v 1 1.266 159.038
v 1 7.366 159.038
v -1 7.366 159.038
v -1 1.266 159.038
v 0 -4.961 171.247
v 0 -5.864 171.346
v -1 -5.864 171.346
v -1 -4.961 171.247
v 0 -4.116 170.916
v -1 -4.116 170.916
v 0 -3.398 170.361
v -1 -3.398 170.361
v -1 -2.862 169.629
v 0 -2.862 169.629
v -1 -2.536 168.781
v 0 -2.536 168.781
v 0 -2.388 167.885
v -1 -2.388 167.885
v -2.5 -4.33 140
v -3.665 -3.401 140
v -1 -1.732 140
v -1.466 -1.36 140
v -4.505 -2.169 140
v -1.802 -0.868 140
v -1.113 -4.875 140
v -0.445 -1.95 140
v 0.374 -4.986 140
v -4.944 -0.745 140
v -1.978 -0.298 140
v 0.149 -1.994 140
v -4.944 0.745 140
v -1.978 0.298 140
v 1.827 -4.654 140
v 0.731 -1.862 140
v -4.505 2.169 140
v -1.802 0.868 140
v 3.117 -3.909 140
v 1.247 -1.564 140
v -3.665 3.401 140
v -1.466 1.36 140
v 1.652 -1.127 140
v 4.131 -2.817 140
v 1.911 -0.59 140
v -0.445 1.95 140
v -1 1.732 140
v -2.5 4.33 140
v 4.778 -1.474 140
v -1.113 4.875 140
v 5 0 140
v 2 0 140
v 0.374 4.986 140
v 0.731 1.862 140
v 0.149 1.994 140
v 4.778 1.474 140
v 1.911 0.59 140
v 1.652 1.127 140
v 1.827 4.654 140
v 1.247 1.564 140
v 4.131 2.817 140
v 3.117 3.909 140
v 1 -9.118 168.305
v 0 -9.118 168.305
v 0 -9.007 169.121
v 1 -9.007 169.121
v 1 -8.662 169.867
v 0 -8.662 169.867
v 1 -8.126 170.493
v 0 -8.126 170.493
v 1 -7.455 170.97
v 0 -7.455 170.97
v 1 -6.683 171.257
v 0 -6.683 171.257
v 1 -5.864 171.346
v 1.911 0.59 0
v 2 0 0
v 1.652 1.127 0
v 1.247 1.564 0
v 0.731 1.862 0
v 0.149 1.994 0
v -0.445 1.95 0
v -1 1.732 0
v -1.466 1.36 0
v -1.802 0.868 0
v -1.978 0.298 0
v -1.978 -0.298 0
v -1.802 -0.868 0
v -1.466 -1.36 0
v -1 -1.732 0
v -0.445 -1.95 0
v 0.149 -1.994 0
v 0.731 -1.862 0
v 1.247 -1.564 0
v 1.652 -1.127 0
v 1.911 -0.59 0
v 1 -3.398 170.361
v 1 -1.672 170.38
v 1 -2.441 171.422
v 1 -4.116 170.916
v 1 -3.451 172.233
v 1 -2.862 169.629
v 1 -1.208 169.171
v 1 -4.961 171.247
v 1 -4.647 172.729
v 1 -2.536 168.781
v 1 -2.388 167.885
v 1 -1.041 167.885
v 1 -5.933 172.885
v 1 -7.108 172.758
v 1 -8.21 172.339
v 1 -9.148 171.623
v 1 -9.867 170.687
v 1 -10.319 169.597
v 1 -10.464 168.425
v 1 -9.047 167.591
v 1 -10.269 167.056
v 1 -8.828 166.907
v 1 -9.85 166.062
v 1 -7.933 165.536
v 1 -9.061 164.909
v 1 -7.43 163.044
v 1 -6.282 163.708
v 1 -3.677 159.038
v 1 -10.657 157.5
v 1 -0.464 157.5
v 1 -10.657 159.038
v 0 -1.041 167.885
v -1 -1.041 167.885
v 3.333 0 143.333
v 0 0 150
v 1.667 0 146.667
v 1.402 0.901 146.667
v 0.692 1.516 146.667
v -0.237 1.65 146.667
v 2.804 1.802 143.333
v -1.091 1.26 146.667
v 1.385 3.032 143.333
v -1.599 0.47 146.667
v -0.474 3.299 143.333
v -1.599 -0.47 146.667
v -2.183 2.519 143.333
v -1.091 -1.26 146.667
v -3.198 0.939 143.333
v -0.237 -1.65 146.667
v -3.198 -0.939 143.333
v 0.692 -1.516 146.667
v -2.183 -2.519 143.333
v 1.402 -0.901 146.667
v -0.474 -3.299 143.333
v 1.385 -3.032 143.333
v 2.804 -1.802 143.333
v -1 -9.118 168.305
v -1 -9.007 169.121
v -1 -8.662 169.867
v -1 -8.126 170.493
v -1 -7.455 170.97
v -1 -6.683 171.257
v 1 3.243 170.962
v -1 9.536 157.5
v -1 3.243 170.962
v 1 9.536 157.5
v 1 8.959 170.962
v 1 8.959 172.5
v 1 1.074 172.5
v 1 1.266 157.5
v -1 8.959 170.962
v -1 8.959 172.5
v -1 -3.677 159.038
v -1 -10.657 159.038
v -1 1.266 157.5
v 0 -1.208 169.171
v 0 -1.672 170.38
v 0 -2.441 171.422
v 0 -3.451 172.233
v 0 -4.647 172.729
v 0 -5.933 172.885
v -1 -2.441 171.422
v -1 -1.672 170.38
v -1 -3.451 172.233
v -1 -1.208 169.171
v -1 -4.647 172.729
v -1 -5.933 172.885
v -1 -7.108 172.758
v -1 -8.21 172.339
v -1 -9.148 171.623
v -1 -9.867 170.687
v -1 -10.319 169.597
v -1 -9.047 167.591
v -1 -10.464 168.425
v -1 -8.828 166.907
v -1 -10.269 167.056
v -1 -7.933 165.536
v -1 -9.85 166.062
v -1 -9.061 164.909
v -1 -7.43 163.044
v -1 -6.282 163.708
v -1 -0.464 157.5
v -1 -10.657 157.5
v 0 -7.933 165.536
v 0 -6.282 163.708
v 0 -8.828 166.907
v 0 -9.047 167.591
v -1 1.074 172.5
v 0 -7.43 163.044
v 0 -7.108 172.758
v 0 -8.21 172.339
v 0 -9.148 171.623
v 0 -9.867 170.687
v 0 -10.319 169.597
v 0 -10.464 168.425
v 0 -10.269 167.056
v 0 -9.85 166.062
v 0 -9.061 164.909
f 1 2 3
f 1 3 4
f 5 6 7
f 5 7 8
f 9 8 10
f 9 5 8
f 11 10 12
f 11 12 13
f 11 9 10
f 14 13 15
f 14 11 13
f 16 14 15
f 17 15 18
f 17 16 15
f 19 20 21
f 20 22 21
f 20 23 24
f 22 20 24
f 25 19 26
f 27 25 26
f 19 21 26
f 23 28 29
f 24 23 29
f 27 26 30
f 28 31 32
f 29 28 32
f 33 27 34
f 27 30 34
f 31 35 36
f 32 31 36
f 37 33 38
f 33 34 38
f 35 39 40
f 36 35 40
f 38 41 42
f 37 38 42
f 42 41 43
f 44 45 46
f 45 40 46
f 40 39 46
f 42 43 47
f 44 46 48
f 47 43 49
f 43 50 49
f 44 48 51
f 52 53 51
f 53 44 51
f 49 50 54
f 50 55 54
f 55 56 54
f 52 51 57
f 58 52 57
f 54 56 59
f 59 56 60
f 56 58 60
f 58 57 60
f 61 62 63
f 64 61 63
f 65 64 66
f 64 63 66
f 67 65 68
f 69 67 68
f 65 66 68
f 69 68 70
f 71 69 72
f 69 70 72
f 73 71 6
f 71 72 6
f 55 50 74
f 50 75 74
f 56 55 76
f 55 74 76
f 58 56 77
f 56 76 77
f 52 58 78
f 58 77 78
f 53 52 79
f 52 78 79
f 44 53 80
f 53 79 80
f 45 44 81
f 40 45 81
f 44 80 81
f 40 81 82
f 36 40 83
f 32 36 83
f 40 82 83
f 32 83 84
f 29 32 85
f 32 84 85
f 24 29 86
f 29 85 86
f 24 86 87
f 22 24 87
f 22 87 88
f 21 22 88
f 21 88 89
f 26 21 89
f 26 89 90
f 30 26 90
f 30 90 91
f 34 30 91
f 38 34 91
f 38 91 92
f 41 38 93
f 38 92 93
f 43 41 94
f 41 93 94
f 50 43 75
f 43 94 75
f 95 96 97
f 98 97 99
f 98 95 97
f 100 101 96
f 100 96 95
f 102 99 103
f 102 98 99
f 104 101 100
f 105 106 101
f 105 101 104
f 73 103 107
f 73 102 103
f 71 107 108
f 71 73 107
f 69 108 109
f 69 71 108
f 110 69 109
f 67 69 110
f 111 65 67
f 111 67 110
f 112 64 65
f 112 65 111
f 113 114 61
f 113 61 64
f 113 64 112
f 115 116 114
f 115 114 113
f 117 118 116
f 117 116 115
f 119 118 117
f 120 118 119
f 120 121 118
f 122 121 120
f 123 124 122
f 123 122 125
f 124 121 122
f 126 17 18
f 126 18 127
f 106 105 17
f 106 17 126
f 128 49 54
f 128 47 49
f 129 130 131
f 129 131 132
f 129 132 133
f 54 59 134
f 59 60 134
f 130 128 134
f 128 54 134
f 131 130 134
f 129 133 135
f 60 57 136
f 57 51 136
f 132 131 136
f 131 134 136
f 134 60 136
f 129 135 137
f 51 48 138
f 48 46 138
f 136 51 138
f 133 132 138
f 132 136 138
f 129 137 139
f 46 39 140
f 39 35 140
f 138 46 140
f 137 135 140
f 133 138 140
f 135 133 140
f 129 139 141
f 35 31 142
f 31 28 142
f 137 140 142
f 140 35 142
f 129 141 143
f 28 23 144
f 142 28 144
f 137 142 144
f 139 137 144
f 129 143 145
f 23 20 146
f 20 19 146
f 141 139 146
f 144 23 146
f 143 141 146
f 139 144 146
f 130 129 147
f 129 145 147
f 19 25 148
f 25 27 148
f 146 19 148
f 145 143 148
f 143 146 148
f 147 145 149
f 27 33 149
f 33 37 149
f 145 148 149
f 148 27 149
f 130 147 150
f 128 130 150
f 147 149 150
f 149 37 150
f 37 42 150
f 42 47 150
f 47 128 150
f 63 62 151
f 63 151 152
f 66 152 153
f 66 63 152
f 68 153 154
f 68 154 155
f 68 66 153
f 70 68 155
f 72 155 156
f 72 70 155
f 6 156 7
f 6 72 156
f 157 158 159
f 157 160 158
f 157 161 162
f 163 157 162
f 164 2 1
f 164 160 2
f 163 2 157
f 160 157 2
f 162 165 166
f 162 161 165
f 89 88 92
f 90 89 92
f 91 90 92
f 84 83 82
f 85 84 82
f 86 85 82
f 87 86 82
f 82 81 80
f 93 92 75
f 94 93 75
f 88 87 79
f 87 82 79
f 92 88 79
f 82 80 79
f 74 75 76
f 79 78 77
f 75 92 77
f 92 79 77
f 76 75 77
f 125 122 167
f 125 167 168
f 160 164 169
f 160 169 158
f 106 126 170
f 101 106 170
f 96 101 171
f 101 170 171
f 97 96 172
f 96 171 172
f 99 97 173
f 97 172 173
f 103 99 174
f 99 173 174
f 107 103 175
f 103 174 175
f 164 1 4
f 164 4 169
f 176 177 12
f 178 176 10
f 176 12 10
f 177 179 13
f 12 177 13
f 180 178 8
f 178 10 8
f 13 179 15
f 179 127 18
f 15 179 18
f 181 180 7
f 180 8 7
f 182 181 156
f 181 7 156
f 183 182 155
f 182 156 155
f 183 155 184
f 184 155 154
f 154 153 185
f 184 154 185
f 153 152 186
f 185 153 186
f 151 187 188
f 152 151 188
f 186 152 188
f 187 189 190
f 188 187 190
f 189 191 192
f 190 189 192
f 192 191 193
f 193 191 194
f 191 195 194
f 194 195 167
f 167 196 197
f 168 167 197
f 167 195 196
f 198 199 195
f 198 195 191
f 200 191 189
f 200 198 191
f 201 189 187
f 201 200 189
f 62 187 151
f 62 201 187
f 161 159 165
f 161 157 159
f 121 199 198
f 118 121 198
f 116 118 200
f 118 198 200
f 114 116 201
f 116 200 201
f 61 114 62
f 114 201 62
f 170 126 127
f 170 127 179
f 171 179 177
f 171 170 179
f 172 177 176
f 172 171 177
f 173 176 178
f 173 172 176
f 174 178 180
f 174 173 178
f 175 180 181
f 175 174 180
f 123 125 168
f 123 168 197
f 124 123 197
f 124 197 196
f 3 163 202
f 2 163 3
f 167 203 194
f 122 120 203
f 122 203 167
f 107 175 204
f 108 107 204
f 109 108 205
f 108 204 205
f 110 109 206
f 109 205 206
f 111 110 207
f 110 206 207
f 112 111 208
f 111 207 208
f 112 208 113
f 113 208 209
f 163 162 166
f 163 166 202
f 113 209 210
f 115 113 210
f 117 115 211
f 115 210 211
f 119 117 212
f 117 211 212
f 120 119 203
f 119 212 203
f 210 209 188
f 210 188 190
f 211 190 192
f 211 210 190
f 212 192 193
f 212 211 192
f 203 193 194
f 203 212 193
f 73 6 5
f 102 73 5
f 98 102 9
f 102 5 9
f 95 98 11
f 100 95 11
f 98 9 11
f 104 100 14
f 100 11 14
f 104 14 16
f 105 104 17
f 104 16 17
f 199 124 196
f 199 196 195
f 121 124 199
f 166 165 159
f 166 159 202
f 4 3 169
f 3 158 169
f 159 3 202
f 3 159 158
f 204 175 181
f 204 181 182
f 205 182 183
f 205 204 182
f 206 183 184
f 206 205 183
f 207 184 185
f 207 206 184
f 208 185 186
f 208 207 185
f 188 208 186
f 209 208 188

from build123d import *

# Parameters (mm, degrees)
BOSS_EXTRUDE1_DEPTH        = 1
BOSS_EXTRUDE1_DEPTH_BACK   = 1
BOSS_EXTRUDE1_2_DEPTH      = 1
BOSS_EXTRUDE1_2_DEPTH_BACK = 1


with BuildPart() as part:
    # Sketch2 → Revolve1 (revolve)
    with BuildSketch(Plane(origin=(0, 0, 0), x_dir=(1, 0, 0), z_dir=(0, 1, 0))):
        Polygon((0, -150), (5, -140), (2, -140), (2, 0), (0, 0), align=None)
    revolve(axis=Axis((0, 0, -41.949952025), (0, 0, 1)))


with BuildPart() as body_2:
    # Sketch3 → Boss-Extrude1 (new, two sides: drawn at the far end of the back side and taken through both)
    with BuildSketch(Plane(origin=(0, 0, 0), x_dir=(0, -1, 0), z_dir=(1, 0, 0)).offset(-BOSS_EXTRUDE1_DEPTH_BACK)):
        Polygon((-8.958586521, -170.961538462), (-8.958586521, -172.5), (-1.073971137, -172.5), (-7.366038444, -159.038461538), (-1.266278829, -159.038461538), (-1.266278829, -157.5), (-9.535509598, -157.5), (-3.243442291, -170.961538462), align=None)
    extrude(amount=BOSS_EXTRUDE1_DEPTH + BOSS_EXTRUDE1_DEPTH_BACK)


with BuildPart() as body_3:
    # Sketch3 → Boss-Extrude1 2 (new, two sides: drawn at the far end of the back side and taken through both)
    with BuildSketch(Plane(origin=(0, 0, 0), x_dir=(0, -1, 0), z_dir=(1, 0, 0)).offset(-BOSS_EXTRUDE1_2_DEPTH_BACK)):
        with BuildLine():
            Line((2.387567325, -167.884615385), (1.041413479, -167.884615385))
            add(Edge.make_bspline(
                [(1.041413479, -167.884615385), (1.050185498, -168.063205784), (1.067413511, -168.413952575), (1.14812731, -168.925328289), (1.263511735, -169.414179653), (1.427038382, -169.876315664), (1.628979502, -170.317256926), (1.876213873, -170.731148249), (2.163470857, -171.122097454), (2.490223471, -171.482702577), (2.844780172, -171.812340745), (3.225016614, -172.100012522), (3.627024685, -172.340286171), (4.047317539, -172.542241714), (4.490755987, -172.693649809), (4.953101254, -172.806041475), (5.436443094, -172.873650782), (5.765757104, -172.880918932), (5.933240402, -172.884615385)],
                knots=[0, 0, 0, 0, 1.100776268, 2.161895295, 3.184016182, 4.190939212, 5.176500551, 6.166955529, 7.155448256, 8.160289653, 9.16017456, 10.133824356, 11.091467644, 12.04088621, 13.000931625, 13.972173743, 14.968683325, 16, 16, 16, 16], degree=3))
            add(Edge.make_bspline(
                [(5.933240402, -172.884615385), (6.097729437, -172.880796104), (6.420944515, -172.873291355), (6.892475118, -172.807873473), (7.3424284, -172.707626401), (7.765705045, -172.559076032), (8.166649061, -172.372677813), (8.540296096, -172.140867206), (8.895681325, -171.87461271), (9.21536306, -171.560552476), (9.509029299, -171.225449413), (9.762151841, -170.867562158), (9.980142966, -170.497495718), (10.158561893, -170.112359334), (10.293811374, -169.710898815), (10.394018278, -169.2969631), (10.451301959, -168.865775091), (10.460045253, -168.573881456), (10.464490402, -168.425480769)],
                knots=[0, 0, 0, 0, 1.111674182, 2.184400057, 3.212814286, 4.223731311, 5.211378316, 6.196328225, 7.191884489, 8.207283132, 9.220262353, 10.201199469, 11.166417575, 12.120932471, 13.06540007, 14.026332106, 14.996573967, 16, 16, 16, 16], degree=3))
            add(Edge.make_bspline(
                [(10.464490402, -168.425480769), (10.457233447, -168.216561568), (10.442846886, -167.802389402), (10.319786944, -167.193752958), (10.127581249, -166.604071894), (9.896184514, -166.129467281), (9.662685279, -165.747074226), (9.452479023, -165.43207523), (9.204998347, -165.092995253), (8.922357616, -164.728461871), (8.599689356, -164.343248958), (8.245376446, -163.929497135), (7.850268631, -163.494856958), (7.573203067, -163.197798463), (7.429634633, -163.043870192)],
                knots=[0, 0, 0, 0, 1.184416499, 2.348048165, 3.509039915, 4.696071444, 5.333504901, 6.05069495, 6.844171097, 7.714965912, 8.667477798, 9.695072654, 10.805644396, 12, 12, 12, 12], degree=3))
            Line((7.429634633, -163.043870192), (3.676629825, -159.038461538))
            Line((3.676629825, -159.038461538), (10.656798094, -159.038461538))
            Line((10.656798094, -159.038461538), (10.656798094, -157.5))
            Line((10.656798094, -157.5), (0.464490402, -157.5))
            Line((0.464490402, -157.5), (6.281798094, -163.707932692))
            add(Edge.make_bspline(
                [(6.281798094, -163.707932692), (6.423441922, -163.855774514), (6.695510728, -164.139748395), (7.080161273, -164.554467176), (7.426195028, -164.938755758), (7.733841533, -165.294317016), (8.003353921, -165.619135251), (8.233869872, -165.915755986), (8.426408224, -166.181633708), (8.630458754, -166.493975739), (8.825034475, -166.87577944), (8.996046625, -167.340016559), (9.099575053, -167.818969101), (9.112057685, -168.142533031), (9.118336556, -168.305288462)],
                knots=[0, 0, 0, 0, 1.329530082, 2.553755191, 3.672934919, 4.687409497, 5.60679272, 6.413407421, 7.126401618, 7.737995624, 8.834647426, 9.90044882, 10.943907757, 12, 12, 12, 12], degree=3))
            add(Edge.make_bspline(
                [(9.118336556, -168.305288462), (9.115639933, -168.407648622), (9.110325407, -168.609380842), (9.06253371, -168.904957531), (8.992318222, -169.191181234), (8.884094464, -169.464512999), (8.754067603, -169.730328736), (8.5879487, -169.980546816), (8.398118417, -170.223696572), (8.1779246, -170.451440602), (7.936192702, -170.660089498), (7.68078048, -170.844903048), (7.410567913, -170.999357413), (7.126681095, -171.125972124), (6.829914955, -171.225295262), (6.519694576, -171.294117725), (6.196877375, -171.337328376), (5.976448106, -171.343174826), (5.864129825, -171.346153846)],
                knots=[0, 0, 0, 0, 0.991504627, 1.954065223, 2.895985987, 3.842598665, 4.797835564, 5.759220273, 6.74786863, 7.784730864, 8.824135544, 9.839918996, 10.835834653, 11.835434876, 12.84861661, 13.863796685, 14.911511676, 16, 16, 16, 16], degree=3))
            add(Edge.make_bspline(
                [(5.864129825, -171.346153846), (5.746796292, -171.343211269), (5.516372606, -171.337432534), (5.178786616, -171.293634499), (4.854486528, -171.227304609), (4.548469717, -171.121707967), (4.254331796, -170.998120893), (3.97957637, -170.838097372), (3.716485215, -170.655245751), (3.47034786, -170.442052376), (3.246169917, -170.201389167), (3.042233236, -169.939431517), (2.869435664, -169.651535448), (2.716045003, -169.344609108), (2.59873143, -169.010219964), (2.498436733, -168.656545911), (2.42558412, -168.278540852), (2.400450063, -168.018104774), (2.387567325, -167.884615385)],
                knots=[0, 0, 0, 0, 1.031072318, 2.024855787, 2.988461151, 3.935103592, 4.865765533, 5.788564469, 6.724086513, 7.67908574, 8.64457978, 9.611397706, 10.591395687, 11.591555111, 12.622101007, 13.700900657, 14.821571223, 16, 16, 16, 16], degree=3))
        make_face()
    extrude(amount=BOSS_EXTRUDE1_2_DEPTH + BOSS_EXTRUDE1_2_DEPTH_BACK)


solid = Compound([part.part, body_2.part, body_3.part])
